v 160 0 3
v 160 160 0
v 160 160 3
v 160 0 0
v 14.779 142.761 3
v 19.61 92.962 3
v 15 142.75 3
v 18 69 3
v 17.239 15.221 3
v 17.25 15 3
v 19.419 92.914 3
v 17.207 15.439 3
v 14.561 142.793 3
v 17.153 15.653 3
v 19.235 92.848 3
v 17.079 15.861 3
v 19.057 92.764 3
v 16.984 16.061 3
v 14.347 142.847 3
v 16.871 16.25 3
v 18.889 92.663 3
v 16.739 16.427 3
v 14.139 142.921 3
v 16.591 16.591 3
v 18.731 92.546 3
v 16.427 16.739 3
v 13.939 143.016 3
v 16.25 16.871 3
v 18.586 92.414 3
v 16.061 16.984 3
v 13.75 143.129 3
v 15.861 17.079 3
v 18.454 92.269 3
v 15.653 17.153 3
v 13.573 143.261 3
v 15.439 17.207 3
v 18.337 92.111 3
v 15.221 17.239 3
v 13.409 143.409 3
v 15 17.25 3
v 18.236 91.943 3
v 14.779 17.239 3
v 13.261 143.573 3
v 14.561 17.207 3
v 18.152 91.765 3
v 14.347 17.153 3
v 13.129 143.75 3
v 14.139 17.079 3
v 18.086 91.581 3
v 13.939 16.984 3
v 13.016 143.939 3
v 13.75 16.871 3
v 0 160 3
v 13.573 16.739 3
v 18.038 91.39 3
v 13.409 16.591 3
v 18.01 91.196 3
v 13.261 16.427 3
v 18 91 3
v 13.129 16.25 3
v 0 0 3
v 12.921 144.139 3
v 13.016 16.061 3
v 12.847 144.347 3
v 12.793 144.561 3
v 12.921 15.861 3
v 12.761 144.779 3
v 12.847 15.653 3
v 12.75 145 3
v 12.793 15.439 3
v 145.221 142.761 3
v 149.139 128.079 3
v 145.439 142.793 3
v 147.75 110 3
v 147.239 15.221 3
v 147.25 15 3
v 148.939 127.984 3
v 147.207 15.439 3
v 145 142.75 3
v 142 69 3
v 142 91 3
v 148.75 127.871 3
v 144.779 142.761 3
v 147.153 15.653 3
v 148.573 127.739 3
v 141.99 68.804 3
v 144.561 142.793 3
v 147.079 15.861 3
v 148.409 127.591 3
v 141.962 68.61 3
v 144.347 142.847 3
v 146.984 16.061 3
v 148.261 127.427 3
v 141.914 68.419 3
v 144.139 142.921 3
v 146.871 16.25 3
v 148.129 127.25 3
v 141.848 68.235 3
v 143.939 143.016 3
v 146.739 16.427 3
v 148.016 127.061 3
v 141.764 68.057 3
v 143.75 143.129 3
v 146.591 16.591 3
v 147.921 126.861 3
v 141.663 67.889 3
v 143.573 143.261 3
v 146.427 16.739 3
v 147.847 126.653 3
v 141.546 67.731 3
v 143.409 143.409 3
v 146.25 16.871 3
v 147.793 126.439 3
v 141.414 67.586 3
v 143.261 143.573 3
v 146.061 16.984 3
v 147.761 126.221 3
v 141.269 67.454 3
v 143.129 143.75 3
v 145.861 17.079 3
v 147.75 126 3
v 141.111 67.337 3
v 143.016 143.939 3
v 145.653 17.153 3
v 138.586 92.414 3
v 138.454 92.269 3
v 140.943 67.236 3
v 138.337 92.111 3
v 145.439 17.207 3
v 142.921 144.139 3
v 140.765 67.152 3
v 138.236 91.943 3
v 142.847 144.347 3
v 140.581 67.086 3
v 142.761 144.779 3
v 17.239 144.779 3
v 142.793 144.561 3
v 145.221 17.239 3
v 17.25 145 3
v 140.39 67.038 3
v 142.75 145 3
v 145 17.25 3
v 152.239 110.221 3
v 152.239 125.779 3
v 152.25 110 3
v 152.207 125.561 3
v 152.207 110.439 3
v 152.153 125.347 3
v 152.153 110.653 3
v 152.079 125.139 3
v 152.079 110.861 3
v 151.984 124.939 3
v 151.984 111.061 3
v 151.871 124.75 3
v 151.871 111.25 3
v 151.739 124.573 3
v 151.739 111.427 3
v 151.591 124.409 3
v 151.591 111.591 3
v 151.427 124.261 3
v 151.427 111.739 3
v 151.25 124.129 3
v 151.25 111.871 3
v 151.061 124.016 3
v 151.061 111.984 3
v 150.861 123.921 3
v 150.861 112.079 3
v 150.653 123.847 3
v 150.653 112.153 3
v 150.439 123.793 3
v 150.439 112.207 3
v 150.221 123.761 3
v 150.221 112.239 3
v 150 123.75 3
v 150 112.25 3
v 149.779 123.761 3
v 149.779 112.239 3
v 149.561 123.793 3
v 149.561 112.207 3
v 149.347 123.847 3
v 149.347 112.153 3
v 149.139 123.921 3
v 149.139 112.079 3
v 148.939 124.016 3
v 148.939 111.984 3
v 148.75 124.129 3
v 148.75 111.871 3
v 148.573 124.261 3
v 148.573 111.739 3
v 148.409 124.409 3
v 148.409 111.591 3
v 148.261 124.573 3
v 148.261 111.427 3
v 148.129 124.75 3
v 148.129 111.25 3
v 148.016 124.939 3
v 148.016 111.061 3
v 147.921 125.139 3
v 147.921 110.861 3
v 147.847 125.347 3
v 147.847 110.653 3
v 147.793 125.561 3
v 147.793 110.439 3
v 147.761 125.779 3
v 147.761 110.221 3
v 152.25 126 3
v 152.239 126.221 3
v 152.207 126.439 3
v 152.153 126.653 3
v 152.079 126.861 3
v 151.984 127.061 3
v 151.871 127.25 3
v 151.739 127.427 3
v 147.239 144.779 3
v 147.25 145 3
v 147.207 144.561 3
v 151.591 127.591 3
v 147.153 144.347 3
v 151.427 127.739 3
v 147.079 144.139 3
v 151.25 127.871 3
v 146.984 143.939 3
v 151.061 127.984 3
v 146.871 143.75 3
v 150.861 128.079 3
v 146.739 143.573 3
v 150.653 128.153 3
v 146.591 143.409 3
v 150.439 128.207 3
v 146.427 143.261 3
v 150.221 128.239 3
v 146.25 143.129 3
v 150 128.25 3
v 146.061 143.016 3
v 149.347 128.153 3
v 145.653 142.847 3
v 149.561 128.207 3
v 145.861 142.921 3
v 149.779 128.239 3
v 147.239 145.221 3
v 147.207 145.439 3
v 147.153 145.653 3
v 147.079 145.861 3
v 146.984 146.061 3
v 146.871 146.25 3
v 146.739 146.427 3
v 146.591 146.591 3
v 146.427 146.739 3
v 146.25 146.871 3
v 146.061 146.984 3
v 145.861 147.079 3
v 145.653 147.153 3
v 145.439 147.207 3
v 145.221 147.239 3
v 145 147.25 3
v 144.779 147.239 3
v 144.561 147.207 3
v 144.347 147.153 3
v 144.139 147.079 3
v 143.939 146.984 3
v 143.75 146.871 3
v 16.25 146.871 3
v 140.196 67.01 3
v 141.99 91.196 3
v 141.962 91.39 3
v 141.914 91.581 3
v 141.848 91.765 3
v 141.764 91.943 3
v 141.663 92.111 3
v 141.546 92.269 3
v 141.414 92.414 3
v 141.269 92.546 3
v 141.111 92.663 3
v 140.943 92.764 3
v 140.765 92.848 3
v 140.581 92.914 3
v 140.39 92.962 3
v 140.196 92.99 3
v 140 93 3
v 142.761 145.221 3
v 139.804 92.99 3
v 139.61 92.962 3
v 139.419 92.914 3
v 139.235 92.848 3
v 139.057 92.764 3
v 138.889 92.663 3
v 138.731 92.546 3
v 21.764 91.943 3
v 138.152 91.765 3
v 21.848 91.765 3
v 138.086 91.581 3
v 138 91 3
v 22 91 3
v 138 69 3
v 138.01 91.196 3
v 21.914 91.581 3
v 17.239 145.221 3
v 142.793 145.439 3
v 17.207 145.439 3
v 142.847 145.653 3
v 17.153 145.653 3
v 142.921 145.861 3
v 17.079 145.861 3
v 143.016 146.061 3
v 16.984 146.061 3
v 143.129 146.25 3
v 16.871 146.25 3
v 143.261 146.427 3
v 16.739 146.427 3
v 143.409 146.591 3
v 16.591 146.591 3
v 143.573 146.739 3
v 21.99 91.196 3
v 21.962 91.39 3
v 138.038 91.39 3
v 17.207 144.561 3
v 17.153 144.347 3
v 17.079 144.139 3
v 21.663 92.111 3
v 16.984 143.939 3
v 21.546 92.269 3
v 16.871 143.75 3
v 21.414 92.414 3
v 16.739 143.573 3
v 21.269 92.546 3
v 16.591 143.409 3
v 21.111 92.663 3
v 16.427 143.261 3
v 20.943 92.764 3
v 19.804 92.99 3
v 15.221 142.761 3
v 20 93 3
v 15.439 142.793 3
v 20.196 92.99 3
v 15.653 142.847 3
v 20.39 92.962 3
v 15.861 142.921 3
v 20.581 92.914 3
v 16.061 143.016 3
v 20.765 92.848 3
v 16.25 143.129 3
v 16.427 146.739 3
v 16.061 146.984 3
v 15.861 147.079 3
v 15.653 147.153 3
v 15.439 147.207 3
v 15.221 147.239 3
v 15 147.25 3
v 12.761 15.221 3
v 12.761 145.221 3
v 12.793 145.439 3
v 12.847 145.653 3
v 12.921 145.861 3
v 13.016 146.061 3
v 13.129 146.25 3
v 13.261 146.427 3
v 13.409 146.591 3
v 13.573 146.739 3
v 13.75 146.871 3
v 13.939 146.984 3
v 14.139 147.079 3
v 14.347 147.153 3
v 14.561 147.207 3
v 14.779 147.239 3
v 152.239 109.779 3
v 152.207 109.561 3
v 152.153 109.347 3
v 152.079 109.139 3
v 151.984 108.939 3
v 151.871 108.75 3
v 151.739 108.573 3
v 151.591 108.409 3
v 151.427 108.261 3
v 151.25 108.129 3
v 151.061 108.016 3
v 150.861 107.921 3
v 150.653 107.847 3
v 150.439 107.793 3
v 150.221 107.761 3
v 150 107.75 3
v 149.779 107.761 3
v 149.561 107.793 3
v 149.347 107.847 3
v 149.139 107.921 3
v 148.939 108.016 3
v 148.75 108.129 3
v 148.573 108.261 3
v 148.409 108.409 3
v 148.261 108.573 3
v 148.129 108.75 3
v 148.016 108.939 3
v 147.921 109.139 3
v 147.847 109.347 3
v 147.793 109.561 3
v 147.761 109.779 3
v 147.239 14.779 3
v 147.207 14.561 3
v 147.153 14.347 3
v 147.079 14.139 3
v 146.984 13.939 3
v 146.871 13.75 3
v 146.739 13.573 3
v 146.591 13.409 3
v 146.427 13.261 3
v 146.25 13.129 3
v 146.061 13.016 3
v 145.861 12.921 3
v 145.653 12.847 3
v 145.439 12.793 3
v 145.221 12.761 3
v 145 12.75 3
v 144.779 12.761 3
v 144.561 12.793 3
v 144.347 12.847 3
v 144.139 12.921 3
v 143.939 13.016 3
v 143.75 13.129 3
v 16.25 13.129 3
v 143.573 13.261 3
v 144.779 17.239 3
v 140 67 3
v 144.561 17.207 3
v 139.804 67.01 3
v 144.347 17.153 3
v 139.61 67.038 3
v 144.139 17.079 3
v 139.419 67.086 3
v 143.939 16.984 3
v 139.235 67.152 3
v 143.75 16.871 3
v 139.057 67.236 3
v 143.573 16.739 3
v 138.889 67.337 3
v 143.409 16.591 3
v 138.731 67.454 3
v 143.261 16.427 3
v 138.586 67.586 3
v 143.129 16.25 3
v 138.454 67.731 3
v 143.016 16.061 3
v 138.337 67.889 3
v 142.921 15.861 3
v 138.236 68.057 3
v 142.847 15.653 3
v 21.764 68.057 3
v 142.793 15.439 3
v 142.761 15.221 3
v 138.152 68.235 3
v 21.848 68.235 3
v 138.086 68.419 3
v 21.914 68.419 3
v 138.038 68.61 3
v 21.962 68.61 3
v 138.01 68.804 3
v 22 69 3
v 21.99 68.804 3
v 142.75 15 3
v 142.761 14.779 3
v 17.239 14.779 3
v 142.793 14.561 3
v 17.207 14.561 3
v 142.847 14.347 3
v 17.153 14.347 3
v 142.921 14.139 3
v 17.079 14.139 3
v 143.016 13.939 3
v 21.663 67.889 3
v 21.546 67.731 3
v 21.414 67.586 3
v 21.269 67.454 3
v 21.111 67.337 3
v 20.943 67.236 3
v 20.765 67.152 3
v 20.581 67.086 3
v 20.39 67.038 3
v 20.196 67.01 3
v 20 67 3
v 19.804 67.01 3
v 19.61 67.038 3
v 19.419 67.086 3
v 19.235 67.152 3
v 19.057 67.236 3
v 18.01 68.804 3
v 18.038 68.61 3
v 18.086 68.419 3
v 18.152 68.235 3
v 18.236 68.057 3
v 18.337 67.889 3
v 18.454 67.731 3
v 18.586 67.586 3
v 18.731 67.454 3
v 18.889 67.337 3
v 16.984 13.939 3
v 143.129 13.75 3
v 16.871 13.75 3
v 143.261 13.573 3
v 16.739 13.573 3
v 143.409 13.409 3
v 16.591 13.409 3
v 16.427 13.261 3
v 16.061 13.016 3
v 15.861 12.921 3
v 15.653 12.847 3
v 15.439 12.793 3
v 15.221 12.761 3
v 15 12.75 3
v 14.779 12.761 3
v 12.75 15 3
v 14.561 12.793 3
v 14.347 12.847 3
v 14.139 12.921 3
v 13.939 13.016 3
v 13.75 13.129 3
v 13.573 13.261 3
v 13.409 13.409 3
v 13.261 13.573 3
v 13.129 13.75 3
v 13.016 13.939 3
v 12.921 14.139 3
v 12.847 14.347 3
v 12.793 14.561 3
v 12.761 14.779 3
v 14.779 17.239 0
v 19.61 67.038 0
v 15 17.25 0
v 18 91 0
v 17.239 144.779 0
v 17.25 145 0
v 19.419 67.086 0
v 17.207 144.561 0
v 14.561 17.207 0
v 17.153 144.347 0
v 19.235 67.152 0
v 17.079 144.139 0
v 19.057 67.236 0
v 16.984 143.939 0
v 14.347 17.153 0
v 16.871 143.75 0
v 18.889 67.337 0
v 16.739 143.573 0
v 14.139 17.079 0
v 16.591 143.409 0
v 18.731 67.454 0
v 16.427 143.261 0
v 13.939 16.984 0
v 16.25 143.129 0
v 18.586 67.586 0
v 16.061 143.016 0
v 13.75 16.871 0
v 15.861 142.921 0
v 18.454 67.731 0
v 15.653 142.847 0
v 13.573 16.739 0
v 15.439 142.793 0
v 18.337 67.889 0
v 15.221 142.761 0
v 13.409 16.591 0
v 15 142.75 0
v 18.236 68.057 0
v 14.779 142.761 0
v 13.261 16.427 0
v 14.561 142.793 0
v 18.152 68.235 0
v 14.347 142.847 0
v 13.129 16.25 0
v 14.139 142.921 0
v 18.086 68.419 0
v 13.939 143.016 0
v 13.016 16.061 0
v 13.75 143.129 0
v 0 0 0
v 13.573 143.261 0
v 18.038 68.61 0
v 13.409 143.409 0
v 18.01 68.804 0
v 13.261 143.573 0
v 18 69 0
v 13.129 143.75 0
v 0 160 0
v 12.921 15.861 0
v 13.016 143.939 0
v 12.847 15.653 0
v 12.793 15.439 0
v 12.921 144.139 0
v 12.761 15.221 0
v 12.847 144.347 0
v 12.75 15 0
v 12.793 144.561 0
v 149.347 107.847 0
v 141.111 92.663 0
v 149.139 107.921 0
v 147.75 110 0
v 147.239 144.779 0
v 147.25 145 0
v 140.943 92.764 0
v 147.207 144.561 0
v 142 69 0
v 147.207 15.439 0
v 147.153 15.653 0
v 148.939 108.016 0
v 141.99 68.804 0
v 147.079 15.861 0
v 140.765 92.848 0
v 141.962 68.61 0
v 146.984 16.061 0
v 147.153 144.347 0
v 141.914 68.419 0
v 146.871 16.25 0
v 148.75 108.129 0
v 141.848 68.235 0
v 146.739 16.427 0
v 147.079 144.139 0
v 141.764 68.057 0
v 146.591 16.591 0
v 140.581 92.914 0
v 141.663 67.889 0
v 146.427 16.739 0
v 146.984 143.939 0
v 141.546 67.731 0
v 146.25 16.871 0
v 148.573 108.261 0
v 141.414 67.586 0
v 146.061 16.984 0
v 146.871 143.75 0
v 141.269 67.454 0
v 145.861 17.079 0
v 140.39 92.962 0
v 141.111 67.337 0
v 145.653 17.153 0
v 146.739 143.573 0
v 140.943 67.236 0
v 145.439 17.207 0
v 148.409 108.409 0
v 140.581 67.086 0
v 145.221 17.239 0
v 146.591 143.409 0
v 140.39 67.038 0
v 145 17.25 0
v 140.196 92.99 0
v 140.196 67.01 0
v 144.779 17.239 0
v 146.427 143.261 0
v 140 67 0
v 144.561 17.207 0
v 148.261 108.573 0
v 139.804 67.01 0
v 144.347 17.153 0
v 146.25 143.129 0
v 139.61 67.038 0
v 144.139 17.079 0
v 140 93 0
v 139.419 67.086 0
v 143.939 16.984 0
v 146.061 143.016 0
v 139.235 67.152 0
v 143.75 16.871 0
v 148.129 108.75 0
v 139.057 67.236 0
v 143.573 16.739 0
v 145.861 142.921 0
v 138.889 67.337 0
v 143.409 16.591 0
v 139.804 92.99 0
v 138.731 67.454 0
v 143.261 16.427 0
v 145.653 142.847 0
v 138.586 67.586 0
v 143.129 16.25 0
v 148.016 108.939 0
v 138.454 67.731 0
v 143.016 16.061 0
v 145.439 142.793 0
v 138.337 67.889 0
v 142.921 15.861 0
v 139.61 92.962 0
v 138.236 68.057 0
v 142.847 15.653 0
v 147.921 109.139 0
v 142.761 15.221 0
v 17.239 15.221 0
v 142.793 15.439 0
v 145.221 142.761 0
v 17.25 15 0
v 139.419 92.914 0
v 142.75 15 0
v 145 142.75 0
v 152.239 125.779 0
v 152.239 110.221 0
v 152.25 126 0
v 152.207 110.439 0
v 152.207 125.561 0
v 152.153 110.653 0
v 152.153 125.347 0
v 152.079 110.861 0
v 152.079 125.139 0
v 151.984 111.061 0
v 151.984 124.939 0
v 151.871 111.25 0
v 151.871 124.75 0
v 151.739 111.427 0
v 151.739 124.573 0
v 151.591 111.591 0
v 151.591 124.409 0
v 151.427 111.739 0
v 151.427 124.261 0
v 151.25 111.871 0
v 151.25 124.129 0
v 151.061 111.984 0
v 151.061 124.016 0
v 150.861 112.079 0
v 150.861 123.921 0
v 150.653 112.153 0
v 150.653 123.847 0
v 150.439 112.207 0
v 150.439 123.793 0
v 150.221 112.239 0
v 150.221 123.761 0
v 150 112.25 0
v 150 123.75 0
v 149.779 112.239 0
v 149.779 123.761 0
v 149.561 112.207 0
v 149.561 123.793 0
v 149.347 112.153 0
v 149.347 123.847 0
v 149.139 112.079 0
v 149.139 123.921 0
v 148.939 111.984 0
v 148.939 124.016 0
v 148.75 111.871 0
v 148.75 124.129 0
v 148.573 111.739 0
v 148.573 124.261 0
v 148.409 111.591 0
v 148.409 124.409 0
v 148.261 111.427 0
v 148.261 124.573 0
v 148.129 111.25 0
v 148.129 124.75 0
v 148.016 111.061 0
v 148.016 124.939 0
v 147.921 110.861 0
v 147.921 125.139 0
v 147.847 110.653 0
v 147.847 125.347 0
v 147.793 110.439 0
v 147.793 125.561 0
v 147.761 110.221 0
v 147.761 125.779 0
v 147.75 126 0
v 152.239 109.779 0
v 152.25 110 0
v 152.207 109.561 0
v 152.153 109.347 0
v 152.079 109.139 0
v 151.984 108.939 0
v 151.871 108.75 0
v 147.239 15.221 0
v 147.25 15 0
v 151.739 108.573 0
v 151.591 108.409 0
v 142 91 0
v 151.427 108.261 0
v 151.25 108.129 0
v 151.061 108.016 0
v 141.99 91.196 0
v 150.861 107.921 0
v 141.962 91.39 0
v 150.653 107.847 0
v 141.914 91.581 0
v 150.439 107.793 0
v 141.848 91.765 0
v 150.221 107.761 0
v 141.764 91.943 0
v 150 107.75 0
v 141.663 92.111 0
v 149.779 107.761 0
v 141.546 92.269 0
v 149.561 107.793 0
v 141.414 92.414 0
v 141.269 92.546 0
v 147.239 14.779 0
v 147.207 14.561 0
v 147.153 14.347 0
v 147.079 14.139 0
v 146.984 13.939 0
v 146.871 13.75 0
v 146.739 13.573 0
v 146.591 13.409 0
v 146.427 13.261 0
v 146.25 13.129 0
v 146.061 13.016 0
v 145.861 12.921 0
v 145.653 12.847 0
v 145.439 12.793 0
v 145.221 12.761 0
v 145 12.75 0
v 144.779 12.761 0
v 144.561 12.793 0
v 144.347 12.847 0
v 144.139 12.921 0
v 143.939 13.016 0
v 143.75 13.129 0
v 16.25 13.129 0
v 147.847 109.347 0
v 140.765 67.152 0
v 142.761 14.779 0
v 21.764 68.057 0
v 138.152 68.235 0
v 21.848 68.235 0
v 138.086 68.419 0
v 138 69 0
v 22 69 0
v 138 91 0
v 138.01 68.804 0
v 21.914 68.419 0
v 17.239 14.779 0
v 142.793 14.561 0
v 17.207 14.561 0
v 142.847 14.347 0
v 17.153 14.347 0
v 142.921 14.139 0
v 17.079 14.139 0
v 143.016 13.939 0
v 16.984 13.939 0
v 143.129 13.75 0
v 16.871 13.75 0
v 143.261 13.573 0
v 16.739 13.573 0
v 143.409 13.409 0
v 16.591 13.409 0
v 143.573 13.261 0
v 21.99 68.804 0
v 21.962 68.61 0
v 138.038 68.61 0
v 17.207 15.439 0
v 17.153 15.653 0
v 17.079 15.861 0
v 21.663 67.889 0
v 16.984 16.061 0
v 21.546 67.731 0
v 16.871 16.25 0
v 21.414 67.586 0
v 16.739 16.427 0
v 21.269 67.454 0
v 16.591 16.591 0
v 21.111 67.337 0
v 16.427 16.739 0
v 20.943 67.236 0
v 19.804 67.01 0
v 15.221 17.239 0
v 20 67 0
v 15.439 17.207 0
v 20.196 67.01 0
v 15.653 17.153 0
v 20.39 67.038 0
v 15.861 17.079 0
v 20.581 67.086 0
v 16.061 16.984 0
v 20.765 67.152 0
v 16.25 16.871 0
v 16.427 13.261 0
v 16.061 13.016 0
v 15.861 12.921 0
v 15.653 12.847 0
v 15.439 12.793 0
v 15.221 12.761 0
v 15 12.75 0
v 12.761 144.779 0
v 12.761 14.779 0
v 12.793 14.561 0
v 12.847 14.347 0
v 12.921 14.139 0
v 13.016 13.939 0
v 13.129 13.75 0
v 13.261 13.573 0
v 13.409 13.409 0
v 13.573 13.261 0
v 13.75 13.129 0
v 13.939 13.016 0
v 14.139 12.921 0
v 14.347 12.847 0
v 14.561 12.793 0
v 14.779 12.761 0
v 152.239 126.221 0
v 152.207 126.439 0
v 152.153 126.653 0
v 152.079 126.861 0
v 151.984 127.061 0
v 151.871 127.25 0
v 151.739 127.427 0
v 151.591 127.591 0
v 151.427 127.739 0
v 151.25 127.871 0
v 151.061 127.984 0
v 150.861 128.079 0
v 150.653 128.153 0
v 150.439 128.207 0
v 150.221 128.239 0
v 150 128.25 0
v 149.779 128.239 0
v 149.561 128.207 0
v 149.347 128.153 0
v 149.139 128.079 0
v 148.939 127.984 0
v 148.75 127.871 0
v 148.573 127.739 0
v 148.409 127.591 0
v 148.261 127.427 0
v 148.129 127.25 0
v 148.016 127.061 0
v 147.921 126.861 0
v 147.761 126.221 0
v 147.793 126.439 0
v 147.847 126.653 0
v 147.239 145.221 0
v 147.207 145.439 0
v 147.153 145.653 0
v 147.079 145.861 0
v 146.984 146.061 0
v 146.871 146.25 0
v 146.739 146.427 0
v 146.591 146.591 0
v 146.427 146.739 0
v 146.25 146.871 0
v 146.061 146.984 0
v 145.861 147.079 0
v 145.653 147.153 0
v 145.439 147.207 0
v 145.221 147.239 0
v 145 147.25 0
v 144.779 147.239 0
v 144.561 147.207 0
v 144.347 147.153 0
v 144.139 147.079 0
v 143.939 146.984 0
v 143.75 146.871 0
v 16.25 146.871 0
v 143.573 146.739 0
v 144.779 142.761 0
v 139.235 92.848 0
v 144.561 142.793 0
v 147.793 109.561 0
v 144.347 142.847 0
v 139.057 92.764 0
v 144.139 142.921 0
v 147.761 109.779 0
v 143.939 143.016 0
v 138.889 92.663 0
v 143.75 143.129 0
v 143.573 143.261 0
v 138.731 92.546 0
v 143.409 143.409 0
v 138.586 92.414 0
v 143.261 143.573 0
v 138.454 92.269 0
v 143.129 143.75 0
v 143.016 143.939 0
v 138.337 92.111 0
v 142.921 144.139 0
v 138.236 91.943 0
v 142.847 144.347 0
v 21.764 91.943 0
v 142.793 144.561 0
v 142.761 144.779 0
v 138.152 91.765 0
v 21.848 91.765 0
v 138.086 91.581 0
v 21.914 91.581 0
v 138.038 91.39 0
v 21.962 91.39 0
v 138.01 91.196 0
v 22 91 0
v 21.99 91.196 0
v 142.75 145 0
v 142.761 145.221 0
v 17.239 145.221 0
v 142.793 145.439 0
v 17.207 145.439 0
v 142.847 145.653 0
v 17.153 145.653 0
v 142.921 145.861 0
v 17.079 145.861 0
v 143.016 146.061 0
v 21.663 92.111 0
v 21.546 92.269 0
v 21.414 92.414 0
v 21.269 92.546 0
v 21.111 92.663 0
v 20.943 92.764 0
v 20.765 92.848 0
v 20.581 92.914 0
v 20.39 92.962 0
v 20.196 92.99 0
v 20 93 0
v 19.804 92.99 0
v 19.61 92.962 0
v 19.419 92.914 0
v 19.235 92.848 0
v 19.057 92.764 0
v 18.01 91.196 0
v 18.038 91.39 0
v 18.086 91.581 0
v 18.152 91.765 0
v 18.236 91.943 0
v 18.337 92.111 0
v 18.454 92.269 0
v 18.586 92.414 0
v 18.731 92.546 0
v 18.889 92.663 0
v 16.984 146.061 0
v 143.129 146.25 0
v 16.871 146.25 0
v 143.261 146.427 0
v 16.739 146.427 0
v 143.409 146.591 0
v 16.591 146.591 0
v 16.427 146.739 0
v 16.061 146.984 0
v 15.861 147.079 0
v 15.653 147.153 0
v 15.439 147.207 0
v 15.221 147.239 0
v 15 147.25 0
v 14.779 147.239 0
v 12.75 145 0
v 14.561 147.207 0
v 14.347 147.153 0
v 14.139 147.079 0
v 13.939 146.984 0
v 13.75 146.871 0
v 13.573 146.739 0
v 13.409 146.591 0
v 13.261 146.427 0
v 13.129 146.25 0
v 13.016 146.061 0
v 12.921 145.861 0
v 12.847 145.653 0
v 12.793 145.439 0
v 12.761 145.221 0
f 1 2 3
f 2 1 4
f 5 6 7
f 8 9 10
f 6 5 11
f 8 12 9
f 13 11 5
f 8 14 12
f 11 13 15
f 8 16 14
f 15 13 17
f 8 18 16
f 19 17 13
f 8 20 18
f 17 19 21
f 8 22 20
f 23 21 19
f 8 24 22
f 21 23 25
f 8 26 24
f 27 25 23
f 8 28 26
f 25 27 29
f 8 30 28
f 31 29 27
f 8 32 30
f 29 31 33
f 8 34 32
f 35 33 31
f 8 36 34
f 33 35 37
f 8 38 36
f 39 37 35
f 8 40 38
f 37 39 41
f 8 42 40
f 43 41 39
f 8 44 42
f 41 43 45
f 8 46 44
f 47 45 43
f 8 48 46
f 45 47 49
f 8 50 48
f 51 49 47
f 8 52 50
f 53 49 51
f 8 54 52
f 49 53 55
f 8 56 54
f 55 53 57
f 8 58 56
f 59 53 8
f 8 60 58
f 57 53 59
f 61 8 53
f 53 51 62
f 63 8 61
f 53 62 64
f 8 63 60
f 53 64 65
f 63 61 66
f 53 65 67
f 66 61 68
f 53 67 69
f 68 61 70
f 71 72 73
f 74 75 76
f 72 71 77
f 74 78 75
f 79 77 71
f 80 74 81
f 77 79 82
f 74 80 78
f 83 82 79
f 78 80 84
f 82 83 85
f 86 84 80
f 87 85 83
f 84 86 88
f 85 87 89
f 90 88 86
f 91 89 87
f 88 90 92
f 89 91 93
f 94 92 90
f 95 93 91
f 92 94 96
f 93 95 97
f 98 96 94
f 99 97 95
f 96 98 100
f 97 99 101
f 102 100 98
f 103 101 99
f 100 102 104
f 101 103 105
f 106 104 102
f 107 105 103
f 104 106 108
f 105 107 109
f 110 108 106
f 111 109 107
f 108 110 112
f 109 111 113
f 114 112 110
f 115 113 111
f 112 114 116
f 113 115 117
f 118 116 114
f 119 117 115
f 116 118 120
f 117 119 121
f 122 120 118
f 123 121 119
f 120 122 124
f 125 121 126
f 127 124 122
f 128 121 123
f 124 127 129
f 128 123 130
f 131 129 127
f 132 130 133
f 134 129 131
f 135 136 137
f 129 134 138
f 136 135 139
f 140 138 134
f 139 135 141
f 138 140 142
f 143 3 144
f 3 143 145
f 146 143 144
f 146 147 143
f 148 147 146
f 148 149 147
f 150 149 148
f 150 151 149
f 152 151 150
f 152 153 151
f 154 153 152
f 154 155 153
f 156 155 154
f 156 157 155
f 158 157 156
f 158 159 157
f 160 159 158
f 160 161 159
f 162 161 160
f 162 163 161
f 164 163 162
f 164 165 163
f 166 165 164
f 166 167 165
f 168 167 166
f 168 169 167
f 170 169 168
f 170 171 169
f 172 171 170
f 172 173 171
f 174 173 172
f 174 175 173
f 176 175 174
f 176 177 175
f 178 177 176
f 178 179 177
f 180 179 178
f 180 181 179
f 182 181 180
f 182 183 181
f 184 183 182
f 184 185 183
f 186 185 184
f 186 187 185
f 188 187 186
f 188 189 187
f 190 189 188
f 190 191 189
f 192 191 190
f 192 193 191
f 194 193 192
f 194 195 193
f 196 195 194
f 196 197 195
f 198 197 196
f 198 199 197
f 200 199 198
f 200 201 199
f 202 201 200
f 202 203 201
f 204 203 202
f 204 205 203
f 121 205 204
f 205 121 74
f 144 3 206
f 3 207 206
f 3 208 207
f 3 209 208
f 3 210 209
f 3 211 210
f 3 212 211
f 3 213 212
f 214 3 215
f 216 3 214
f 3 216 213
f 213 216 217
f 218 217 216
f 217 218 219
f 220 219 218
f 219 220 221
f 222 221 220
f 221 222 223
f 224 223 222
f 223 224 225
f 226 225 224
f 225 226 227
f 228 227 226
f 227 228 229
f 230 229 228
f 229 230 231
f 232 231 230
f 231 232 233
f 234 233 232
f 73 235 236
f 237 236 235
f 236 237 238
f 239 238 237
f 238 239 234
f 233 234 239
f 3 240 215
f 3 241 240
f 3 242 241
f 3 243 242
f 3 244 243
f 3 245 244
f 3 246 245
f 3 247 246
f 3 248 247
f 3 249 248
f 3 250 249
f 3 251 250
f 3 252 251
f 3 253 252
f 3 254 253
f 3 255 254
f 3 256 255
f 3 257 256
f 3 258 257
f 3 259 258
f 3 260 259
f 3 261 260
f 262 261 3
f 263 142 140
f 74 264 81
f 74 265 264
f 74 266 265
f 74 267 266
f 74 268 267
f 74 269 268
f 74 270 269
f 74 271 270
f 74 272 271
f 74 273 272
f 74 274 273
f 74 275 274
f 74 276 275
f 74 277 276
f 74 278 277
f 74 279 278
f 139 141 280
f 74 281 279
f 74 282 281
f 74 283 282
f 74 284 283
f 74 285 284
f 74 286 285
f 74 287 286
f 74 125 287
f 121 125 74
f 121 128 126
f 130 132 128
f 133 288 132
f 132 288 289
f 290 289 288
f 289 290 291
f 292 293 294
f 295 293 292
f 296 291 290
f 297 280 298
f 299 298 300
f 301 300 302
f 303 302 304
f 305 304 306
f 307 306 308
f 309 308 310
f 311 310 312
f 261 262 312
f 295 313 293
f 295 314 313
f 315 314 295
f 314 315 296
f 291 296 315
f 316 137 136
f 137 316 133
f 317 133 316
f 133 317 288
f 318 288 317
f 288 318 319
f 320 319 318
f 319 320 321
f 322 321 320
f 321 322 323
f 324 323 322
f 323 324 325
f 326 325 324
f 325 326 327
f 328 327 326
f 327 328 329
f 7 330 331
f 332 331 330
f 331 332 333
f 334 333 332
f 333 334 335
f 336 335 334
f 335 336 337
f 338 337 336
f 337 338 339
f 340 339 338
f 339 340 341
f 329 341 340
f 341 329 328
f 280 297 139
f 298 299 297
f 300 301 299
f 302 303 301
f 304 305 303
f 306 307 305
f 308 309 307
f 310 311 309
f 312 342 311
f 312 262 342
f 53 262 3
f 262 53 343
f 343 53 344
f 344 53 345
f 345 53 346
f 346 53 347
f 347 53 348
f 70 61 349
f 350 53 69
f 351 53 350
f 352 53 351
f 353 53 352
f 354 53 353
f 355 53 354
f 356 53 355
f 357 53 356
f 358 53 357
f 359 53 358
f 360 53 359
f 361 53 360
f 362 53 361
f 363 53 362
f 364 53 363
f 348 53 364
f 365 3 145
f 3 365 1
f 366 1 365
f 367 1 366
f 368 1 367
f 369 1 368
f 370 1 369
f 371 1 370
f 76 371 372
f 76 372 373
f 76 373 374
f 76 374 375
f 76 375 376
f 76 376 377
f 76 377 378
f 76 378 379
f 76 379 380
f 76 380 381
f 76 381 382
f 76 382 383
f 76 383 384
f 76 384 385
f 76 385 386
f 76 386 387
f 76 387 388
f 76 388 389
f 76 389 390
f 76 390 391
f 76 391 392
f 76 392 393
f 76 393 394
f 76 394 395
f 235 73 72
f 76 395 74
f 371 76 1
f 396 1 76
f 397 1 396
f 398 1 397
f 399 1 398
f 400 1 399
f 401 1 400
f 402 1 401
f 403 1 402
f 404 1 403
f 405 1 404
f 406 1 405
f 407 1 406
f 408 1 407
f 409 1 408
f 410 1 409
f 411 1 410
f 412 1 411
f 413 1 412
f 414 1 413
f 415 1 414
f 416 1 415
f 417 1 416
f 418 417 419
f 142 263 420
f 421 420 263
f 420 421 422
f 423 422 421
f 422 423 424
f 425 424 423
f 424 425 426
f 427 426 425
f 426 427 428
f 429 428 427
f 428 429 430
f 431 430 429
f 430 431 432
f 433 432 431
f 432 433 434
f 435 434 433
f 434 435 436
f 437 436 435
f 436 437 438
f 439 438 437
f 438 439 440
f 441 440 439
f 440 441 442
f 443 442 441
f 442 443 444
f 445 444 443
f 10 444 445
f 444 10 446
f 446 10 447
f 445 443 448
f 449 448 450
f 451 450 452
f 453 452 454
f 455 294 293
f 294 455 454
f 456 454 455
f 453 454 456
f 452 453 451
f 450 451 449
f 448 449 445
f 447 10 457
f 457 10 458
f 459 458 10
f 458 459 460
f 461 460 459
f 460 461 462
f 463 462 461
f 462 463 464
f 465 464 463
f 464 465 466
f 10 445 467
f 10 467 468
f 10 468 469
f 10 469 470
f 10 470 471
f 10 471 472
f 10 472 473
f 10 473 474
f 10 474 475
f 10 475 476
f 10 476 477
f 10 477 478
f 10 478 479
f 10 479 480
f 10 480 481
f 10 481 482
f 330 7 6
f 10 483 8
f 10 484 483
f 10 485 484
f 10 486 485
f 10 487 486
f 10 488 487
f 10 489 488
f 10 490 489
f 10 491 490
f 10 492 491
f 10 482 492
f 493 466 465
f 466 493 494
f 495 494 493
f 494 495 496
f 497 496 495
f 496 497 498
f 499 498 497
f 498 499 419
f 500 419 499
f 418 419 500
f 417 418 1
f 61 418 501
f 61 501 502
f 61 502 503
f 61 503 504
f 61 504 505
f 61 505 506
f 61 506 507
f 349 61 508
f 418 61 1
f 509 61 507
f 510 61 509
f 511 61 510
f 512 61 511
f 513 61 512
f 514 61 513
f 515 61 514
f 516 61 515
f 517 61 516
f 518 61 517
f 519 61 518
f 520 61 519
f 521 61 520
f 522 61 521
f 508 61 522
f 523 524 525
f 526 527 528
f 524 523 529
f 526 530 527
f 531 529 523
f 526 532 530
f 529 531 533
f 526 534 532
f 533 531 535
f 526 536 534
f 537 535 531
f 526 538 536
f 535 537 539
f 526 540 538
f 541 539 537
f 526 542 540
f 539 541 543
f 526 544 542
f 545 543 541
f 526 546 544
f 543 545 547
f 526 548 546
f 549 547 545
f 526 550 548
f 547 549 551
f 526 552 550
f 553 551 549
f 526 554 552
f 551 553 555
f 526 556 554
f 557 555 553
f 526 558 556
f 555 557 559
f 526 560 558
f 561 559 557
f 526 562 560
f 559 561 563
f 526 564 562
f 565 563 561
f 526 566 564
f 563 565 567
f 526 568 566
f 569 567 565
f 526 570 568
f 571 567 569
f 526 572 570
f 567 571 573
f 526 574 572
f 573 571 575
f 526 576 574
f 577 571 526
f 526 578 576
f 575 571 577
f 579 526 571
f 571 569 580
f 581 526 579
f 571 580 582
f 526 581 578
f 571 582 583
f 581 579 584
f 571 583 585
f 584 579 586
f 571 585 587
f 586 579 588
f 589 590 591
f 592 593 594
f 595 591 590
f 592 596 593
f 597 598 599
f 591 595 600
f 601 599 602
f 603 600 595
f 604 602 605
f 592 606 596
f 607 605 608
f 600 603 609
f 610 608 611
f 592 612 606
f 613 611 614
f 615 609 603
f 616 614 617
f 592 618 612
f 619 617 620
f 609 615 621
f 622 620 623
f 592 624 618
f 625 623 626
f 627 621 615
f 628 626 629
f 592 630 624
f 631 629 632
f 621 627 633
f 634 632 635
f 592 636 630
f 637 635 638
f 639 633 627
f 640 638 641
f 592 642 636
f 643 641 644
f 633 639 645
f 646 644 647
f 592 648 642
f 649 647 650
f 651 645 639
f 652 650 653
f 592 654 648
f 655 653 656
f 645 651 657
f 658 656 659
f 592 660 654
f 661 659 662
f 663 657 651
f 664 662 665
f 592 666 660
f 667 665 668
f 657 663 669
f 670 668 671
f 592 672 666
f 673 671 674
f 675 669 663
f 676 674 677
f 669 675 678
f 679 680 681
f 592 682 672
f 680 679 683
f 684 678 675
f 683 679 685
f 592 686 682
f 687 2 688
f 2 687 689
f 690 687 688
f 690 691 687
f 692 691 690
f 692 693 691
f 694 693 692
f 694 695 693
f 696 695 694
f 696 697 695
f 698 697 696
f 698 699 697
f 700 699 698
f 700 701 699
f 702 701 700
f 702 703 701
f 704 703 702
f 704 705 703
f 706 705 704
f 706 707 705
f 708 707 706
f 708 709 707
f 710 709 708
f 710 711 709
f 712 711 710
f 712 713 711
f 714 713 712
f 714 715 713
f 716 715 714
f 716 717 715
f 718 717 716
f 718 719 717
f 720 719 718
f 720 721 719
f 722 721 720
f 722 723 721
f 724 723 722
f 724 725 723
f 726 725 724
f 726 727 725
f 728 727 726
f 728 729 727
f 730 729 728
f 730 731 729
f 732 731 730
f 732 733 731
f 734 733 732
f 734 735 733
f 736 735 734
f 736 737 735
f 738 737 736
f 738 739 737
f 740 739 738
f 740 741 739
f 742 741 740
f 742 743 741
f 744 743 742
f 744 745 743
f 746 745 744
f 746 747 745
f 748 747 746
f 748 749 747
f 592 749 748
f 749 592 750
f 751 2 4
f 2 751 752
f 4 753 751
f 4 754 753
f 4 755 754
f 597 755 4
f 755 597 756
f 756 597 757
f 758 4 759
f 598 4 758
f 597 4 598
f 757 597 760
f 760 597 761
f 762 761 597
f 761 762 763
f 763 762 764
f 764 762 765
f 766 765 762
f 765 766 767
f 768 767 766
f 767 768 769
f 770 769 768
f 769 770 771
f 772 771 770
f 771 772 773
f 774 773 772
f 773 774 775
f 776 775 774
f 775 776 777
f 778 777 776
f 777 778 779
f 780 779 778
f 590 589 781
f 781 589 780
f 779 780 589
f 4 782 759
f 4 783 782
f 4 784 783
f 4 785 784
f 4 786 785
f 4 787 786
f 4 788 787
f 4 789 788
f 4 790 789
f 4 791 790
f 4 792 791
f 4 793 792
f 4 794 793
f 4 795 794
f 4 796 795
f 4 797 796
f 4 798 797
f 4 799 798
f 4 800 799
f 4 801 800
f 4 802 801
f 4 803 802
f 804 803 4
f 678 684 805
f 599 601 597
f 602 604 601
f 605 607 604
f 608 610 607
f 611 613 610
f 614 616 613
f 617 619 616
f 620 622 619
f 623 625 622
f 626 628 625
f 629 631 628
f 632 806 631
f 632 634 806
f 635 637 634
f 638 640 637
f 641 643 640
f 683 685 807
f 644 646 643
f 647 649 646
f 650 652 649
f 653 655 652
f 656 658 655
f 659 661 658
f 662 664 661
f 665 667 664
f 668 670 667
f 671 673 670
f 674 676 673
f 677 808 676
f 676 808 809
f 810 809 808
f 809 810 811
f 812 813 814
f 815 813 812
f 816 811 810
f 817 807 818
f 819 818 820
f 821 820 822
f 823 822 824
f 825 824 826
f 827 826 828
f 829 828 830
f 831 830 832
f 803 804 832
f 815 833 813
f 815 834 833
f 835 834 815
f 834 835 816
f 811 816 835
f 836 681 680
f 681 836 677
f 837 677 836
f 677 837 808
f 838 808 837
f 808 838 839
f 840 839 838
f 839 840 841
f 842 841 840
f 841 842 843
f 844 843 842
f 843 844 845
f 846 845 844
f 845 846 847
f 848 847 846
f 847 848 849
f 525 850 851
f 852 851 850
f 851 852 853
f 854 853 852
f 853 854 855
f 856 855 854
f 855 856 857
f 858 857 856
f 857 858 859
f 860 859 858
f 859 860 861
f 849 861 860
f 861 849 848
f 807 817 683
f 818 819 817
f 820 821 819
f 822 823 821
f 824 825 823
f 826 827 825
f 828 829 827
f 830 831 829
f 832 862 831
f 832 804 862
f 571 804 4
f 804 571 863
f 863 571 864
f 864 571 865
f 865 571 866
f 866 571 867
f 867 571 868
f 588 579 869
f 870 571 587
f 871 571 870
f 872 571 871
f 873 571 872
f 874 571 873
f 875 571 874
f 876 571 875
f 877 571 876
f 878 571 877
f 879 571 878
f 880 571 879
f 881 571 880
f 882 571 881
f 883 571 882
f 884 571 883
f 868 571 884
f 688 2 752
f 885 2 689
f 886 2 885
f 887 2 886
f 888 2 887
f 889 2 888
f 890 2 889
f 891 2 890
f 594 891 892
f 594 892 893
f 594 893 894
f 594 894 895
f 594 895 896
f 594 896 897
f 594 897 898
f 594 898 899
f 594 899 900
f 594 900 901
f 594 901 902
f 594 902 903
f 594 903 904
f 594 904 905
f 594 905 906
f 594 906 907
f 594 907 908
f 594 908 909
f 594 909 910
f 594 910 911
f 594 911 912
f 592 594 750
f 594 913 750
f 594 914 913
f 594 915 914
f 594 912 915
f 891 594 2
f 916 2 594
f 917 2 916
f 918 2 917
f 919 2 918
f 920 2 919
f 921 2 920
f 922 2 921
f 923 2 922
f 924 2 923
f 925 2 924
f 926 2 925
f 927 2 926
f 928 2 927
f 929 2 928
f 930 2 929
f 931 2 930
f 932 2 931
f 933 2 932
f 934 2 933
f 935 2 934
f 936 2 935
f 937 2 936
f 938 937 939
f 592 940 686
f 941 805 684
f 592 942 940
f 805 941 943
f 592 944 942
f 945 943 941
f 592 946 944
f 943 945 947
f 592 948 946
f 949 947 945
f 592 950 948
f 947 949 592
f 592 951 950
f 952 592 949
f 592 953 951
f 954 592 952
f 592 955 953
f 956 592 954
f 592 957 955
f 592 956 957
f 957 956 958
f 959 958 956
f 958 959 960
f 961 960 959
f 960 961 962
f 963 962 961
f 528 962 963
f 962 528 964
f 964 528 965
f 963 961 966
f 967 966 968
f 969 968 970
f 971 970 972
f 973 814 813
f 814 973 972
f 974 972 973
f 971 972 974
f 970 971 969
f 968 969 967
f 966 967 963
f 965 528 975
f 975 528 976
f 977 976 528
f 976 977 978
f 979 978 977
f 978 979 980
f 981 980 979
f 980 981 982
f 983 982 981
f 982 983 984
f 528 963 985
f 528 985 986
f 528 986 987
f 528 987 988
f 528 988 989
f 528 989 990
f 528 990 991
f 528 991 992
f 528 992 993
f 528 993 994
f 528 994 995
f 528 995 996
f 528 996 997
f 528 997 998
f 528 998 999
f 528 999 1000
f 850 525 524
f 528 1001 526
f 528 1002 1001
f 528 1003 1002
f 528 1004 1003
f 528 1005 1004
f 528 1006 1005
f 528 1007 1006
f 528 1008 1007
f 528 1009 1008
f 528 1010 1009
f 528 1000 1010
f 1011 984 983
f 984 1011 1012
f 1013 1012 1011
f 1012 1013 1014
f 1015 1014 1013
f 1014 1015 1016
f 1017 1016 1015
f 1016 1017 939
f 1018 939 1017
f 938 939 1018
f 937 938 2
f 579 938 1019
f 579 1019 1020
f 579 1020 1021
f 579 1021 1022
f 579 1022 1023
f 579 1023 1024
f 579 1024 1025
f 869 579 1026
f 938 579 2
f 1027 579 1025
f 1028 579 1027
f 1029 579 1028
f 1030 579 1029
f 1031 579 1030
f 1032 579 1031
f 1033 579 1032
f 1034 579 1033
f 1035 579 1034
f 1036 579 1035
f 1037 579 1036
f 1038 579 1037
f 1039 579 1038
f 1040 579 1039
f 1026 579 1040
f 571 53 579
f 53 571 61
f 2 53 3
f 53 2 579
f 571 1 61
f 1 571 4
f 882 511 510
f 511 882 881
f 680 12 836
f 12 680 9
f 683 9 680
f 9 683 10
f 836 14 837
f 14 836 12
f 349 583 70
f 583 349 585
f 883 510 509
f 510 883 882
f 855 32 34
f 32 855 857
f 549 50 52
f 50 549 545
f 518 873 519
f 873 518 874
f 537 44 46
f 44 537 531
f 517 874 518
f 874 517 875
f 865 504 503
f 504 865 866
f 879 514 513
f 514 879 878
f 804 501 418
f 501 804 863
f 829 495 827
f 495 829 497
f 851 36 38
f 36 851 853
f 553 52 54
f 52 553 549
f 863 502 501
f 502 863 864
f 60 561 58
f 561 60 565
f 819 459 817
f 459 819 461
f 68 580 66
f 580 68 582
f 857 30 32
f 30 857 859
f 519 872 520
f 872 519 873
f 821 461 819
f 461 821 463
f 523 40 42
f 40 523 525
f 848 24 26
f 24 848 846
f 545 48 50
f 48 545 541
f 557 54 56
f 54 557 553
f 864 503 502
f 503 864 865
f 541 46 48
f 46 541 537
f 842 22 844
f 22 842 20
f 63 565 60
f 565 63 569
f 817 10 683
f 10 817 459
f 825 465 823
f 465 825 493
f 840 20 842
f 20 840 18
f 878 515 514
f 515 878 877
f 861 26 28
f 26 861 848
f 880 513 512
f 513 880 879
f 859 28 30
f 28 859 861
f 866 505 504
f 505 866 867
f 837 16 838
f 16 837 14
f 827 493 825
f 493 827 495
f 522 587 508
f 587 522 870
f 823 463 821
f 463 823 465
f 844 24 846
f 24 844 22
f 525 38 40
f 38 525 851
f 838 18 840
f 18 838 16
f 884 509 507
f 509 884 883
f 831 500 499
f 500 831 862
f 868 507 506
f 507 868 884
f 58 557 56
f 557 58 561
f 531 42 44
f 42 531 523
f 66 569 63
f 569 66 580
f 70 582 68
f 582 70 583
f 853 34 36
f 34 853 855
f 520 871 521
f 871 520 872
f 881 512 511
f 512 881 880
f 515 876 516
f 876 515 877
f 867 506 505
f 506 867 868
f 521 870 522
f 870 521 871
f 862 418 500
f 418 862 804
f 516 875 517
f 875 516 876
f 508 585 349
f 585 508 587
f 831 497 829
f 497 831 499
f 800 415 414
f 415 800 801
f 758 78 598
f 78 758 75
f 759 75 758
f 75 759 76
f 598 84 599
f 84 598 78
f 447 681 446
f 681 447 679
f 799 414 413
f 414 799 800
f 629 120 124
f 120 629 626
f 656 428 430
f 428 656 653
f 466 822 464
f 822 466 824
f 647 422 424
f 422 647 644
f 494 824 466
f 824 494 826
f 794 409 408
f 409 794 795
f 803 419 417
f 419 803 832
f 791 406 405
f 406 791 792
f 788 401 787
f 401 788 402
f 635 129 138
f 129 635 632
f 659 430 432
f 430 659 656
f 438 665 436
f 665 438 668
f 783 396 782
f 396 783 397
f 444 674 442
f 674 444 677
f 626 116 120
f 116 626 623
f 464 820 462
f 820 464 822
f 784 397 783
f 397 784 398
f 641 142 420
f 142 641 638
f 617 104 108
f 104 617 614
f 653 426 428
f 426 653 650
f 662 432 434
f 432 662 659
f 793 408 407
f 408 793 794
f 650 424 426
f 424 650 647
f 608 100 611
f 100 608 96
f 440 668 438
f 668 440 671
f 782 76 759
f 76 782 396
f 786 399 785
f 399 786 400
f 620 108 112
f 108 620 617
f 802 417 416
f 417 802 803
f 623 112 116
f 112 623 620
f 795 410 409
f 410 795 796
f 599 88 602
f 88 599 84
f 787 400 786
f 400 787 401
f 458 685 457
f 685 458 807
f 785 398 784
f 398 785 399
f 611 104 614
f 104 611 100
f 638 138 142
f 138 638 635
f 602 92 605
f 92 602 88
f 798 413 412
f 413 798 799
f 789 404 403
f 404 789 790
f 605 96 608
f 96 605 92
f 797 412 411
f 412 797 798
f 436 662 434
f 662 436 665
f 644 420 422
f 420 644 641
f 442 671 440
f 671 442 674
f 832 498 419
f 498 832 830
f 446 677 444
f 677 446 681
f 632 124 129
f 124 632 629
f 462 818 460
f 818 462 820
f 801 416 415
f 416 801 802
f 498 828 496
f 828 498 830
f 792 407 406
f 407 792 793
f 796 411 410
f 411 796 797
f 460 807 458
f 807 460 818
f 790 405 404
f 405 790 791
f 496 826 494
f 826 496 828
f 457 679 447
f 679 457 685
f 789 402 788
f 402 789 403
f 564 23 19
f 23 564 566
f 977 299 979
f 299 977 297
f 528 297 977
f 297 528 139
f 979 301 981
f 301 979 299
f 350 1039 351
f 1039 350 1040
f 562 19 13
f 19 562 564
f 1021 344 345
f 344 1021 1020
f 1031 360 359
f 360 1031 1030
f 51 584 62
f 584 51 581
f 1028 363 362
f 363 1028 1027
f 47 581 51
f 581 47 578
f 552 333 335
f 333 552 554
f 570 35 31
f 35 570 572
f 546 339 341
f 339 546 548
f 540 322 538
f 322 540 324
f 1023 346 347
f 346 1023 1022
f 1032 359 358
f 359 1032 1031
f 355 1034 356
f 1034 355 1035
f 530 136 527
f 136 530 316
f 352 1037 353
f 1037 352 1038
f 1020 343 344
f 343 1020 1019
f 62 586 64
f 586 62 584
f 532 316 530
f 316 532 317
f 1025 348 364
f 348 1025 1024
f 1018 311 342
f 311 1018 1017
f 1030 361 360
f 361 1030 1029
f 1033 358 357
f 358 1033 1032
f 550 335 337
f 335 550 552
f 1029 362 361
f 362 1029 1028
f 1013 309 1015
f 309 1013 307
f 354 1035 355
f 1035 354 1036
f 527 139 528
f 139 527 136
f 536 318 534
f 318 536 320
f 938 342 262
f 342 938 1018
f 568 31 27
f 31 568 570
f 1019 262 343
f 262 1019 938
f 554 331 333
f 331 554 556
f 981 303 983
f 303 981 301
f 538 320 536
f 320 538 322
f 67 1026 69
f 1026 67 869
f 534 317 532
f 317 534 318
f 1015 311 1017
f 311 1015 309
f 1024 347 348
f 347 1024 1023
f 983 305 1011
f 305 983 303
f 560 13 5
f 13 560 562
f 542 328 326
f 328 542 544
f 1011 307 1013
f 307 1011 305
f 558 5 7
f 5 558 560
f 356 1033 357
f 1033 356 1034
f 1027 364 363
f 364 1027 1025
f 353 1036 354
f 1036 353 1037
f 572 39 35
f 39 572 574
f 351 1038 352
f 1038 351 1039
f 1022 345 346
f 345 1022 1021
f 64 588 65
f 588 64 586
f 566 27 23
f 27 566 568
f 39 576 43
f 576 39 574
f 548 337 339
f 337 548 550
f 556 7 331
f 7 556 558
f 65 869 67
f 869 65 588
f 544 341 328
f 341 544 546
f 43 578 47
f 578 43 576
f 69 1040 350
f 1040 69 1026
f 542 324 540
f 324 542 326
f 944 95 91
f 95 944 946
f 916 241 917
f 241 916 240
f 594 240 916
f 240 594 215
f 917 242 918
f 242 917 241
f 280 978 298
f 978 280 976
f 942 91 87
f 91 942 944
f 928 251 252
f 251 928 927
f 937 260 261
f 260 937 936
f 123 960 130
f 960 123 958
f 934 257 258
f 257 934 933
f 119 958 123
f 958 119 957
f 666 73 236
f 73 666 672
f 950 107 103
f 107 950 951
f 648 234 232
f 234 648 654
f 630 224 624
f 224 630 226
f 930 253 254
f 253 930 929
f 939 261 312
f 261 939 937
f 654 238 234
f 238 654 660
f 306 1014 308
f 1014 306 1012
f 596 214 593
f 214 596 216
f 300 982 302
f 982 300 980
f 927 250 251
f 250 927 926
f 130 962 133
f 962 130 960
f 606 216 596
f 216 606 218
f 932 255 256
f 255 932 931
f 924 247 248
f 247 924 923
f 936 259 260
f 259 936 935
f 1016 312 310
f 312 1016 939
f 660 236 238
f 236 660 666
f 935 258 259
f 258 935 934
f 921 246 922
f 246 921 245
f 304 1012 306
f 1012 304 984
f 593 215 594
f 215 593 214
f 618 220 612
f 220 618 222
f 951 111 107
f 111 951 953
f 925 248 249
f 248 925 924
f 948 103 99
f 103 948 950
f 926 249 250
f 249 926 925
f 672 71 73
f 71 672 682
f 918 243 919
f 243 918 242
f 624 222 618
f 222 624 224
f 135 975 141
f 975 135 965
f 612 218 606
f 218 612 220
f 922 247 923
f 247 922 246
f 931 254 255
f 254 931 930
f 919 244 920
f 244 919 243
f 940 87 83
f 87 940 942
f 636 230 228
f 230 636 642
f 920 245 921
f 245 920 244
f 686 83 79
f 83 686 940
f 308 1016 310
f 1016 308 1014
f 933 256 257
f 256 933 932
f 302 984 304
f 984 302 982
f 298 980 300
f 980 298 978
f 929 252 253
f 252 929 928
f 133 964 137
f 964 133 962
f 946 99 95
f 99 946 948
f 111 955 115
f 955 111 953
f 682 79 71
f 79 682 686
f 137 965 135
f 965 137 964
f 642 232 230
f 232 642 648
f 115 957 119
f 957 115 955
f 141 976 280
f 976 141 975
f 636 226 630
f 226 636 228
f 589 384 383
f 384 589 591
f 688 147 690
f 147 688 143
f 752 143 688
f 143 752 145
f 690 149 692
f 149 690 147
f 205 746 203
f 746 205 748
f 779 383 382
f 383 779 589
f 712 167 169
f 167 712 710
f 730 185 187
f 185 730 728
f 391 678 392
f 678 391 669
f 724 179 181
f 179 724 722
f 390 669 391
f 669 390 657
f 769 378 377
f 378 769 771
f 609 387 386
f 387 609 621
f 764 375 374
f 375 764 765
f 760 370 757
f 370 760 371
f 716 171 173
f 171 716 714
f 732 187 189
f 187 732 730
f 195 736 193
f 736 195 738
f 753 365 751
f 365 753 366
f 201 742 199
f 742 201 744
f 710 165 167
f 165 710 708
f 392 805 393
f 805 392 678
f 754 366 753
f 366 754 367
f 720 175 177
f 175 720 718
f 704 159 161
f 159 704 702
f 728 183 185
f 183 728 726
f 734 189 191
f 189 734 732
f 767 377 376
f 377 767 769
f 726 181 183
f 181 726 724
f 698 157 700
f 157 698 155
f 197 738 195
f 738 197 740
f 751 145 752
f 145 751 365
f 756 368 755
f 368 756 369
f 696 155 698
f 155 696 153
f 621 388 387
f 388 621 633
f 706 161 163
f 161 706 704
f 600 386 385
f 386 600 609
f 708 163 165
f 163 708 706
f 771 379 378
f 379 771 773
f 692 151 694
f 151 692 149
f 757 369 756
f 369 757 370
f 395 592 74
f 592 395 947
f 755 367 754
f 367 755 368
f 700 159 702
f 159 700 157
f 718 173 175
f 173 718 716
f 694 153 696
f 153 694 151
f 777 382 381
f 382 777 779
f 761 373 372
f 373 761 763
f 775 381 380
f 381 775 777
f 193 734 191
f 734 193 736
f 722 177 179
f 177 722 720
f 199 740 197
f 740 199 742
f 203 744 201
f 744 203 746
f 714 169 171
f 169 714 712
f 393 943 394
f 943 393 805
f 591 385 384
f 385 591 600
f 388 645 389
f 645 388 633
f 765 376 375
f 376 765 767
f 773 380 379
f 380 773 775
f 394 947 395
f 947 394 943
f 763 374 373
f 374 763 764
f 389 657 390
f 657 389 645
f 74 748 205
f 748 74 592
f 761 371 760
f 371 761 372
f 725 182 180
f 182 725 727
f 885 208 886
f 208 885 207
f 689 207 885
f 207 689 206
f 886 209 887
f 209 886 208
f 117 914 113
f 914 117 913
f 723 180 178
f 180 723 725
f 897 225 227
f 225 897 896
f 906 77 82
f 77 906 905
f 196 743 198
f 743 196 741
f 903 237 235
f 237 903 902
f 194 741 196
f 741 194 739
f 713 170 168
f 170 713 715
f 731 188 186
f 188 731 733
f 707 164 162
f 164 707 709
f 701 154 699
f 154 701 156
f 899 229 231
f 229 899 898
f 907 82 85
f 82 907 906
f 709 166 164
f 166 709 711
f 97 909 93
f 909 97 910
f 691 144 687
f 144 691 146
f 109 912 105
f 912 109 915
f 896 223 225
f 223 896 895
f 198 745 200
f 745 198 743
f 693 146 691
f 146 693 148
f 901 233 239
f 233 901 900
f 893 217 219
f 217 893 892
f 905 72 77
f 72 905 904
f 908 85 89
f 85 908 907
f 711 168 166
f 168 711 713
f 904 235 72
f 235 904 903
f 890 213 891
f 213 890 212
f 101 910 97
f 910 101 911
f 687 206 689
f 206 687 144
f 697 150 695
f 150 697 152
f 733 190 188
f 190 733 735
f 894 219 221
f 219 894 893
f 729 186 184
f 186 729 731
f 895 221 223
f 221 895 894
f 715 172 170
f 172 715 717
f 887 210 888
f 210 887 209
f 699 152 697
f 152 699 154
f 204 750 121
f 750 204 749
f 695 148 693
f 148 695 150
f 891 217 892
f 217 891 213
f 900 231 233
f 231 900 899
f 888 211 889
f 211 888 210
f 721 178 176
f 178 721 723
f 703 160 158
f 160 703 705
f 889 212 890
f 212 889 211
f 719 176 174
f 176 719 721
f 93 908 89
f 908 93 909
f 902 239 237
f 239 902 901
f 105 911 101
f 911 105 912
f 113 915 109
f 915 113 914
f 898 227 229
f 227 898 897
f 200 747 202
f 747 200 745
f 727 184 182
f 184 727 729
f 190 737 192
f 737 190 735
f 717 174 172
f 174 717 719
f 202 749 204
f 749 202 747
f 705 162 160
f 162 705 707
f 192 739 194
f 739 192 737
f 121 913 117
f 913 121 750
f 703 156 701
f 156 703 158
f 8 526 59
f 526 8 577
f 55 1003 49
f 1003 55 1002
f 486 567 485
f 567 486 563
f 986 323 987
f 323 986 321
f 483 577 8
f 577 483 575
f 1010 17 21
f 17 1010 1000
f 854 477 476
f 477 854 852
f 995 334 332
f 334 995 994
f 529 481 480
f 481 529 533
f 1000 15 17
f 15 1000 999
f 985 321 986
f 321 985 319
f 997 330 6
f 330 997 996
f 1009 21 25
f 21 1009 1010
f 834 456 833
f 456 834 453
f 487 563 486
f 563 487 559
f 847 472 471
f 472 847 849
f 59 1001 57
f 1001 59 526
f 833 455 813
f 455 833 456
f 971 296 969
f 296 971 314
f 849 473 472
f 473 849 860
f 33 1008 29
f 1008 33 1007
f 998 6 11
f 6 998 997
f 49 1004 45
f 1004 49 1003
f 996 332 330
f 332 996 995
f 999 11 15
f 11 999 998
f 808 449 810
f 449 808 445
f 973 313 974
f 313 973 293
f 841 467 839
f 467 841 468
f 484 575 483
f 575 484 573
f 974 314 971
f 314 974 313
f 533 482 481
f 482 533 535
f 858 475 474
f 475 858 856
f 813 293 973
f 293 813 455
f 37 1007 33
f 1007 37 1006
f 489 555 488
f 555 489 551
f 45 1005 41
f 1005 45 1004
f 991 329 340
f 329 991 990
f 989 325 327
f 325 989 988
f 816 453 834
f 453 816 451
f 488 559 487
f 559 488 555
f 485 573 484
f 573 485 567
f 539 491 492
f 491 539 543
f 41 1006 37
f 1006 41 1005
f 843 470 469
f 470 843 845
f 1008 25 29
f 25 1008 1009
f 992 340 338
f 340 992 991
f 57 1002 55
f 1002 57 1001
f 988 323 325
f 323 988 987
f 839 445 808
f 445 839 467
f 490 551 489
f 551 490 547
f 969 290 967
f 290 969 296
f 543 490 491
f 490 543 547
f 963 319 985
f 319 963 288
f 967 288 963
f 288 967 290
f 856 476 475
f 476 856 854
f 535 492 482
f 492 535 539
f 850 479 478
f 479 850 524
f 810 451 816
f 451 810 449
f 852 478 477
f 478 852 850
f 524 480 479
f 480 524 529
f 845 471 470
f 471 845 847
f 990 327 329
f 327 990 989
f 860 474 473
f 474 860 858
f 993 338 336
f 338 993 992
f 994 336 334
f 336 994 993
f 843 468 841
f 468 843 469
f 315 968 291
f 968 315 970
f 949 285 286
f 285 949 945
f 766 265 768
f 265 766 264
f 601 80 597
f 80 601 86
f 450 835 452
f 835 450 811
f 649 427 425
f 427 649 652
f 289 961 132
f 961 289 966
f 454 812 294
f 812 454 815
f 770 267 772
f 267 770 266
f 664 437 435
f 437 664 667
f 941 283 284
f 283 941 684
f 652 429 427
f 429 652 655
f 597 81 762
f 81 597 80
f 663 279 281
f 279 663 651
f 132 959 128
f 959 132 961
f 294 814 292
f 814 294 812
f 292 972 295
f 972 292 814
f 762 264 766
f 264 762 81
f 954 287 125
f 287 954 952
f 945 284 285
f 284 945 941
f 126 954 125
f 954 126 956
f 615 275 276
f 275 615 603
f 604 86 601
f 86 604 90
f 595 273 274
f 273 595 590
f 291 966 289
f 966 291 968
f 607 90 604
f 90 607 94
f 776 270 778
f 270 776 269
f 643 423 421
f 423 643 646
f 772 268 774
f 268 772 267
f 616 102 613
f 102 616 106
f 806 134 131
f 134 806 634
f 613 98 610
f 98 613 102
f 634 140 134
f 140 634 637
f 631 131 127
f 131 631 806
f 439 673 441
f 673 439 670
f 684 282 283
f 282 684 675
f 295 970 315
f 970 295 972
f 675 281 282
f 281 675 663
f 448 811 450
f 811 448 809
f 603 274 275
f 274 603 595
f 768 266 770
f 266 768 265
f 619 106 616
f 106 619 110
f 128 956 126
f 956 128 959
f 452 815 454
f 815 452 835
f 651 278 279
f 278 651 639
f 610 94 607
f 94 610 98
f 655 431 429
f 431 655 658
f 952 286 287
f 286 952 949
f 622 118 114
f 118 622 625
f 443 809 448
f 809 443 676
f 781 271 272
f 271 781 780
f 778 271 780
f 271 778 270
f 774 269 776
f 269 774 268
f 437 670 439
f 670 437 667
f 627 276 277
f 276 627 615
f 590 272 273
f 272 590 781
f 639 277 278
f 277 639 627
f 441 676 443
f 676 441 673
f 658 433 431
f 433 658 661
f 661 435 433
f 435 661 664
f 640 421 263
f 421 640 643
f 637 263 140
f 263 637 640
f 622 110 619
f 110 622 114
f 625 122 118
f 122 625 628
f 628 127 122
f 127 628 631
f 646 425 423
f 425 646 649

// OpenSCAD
// Carrier plate SLM-PAS-M01, revision A, 2026-11-10. Millimetres. Generated by hardware/make_cad.py.
// S&L Milestone Solutions. Preliminary: not cut or fitted. Measure the purchased case before cutting.
$fn = 64;
plate_side = 160.0;
plate_thickness = 3.0;

module slot(x, y, w, len) {
    hull() {
        translate([x, y - (len - w) / 2, -1]) cylinder(h = plate_thickness + 2, d = w);
        translate([x, y + (len - w) / 2, -1]) cylinder(h = plate_thickness + 2, d = w);
    }
}

difference() {
    cube([plate_side, plate_side, plate_thickness]);
    translate([15.0, 15.0, -1]) cylinder(h = plate_thickness + 2, d = 4.5);
    translate([145.0, 15.0, -1]) cylinder(h = plate_thickness + 2, d = 4.5);
    translate([15.0, 145.0, -1]) cylinder(h = plate_thickness + 2, d = 4.5);
    translate([145.0, 145.0, -1]) cylinder(h = plate_thickness + 2, d = 4.5);
    translate([150.0, 110.0, -1]) cylinder(h = plate_thickness + 2, d = 4.5);
    translate([150.0, 126.0, -1]) cylinder(h = plate_thickness + 2, d = 4.5);
    slot(20.0, 80.0, 4.0, 26.0);
    slot(140.0, 80.0, 4.0, 26.0);
}

// Reference only: listed case outline. Remove before export.
%translate([plate_side / 2, plate_side / 2, plate_thickness + 10]) cylinder(h = 10, d = 102.0);
